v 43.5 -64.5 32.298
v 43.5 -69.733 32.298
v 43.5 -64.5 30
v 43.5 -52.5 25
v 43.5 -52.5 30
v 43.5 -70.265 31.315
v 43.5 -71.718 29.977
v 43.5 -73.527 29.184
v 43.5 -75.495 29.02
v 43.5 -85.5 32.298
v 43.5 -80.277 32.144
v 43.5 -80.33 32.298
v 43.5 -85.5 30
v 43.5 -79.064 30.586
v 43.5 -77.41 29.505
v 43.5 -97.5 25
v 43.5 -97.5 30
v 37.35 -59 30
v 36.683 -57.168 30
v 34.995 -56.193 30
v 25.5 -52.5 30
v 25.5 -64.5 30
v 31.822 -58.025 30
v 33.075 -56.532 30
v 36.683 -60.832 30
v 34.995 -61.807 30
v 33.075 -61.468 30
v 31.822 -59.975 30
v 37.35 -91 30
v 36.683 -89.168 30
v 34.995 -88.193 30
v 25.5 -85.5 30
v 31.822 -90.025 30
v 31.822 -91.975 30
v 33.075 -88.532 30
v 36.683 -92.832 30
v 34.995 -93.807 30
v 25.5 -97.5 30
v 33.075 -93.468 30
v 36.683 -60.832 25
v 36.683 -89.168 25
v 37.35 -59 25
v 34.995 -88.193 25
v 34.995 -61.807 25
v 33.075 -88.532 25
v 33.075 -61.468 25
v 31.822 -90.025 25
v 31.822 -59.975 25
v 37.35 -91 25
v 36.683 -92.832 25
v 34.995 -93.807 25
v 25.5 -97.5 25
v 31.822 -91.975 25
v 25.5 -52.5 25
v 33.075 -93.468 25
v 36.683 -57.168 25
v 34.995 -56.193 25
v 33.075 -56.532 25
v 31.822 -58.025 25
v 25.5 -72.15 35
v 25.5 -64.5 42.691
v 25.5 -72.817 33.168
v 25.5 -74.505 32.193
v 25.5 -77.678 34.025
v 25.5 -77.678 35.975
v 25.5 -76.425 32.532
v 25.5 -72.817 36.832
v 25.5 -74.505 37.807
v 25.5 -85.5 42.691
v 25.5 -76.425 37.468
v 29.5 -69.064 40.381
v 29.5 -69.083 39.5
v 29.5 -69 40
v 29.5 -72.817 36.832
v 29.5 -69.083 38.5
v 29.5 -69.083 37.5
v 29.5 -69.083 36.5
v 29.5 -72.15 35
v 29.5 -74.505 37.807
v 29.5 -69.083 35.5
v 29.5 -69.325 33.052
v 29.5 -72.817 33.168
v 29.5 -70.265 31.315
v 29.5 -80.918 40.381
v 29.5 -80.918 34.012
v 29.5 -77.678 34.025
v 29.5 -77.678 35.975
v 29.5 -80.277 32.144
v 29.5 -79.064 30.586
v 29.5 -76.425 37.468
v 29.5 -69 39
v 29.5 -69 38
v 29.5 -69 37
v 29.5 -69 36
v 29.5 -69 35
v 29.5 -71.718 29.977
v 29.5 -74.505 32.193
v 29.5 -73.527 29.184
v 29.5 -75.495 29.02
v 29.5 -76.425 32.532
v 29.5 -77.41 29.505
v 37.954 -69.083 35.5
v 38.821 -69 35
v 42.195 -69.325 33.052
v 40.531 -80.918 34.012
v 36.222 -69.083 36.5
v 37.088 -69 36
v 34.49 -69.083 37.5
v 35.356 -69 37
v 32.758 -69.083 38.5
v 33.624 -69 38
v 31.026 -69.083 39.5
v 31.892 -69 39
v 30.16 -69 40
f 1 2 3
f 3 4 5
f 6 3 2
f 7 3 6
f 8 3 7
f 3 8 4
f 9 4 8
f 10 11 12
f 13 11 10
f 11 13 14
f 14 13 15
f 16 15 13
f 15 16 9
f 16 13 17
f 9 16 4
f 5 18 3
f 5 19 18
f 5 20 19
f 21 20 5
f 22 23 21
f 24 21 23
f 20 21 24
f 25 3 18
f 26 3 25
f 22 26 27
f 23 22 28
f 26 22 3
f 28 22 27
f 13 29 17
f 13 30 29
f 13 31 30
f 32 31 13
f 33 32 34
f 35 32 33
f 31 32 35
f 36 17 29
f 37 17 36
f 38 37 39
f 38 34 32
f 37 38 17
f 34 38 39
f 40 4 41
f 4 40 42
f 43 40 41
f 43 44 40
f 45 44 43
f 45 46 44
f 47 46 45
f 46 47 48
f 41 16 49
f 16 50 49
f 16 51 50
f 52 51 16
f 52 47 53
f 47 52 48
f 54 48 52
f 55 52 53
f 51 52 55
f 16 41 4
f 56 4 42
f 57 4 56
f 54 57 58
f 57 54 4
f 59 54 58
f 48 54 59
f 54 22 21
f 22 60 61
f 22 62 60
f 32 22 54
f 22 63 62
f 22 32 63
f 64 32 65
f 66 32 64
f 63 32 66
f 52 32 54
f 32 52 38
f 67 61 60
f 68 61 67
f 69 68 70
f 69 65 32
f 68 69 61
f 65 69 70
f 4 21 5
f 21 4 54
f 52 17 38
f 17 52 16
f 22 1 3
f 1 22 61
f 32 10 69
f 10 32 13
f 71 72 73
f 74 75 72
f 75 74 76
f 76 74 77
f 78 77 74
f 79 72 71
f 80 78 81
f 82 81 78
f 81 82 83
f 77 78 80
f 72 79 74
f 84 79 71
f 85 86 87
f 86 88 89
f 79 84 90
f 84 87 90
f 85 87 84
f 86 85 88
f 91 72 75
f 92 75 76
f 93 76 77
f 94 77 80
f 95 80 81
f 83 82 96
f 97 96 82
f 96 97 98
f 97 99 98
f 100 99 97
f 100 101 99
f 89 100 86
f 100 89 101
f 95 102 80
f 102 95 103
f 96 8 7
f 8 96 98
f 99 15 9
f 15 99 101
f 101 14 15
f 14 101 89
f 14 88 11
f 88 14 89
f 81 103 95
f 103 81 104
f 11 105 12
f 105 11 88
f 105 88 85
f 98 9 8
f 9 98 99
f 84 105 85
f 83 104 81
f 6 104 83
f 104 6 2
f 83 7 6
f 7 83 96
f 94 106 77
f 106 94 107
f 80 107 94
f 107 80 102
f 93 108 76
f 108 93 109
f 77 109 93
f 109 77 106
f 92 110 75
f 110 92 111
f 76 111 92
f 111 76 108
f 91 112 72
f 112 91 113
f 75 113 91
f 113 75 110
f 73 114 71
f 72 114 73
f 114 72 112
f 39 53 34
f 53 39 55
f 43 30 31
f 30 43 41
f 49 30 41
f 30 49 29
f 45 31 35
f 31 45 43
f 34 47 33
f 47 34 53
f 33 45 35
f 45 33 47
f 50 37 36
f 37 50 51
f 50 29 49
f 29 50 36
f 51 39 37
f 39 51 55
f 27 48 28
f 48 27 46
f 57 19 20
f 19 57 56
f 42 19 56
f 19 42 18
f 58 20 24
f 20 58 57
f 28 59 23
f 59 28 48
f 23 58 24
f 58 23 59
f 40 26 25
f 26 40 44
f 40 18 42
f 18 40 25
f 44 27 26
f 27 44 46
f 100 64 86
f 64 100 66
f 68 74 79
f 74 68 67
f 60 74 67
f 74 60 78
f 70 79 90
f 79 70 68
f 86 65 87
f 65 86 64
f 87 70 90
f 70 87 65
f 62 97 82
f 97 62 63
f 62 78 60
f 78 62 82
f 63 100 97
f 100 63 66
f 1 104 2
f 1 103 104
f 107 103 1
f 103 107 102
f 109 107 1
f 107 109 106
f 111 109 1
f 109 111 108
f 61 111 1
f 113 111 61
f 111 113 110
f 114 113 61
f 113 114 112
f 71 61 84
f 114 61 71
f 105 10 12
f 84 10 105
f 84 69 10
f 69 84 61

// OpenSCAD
extrusion_lid_coupler();
module extrusion_lid_coupler(){
//translate([0,0,20])rotate([90,0,0])tslot20(250);
//rotate([90,0,0])tslot20_2060(250);
translate([25.5,-100,25]){
difference(){union(){
translate([0,2.5,0])cube([18,45,5]);
translate([0,13+1.5,0])cube([18,21,18]);
}        
translate([9,9,0])cylinder(r=5.7/2,h=30);
translate([9,50-9,0])cylinder(r=5.7/2,h=30);
translate([-6,25,10])rotate([90,0,90])cylinder(r=5.7/2,h=10);
for (a=[0,1,2,3,4,5,6,7,8]){
translate([4,25,10+(a)])rotate([90,0,90])cylinder(r=12/2,h=16);
}
translate([-4,13,20])rotate([0,30,0])cube([28,24,18]); 
}   
}}  
